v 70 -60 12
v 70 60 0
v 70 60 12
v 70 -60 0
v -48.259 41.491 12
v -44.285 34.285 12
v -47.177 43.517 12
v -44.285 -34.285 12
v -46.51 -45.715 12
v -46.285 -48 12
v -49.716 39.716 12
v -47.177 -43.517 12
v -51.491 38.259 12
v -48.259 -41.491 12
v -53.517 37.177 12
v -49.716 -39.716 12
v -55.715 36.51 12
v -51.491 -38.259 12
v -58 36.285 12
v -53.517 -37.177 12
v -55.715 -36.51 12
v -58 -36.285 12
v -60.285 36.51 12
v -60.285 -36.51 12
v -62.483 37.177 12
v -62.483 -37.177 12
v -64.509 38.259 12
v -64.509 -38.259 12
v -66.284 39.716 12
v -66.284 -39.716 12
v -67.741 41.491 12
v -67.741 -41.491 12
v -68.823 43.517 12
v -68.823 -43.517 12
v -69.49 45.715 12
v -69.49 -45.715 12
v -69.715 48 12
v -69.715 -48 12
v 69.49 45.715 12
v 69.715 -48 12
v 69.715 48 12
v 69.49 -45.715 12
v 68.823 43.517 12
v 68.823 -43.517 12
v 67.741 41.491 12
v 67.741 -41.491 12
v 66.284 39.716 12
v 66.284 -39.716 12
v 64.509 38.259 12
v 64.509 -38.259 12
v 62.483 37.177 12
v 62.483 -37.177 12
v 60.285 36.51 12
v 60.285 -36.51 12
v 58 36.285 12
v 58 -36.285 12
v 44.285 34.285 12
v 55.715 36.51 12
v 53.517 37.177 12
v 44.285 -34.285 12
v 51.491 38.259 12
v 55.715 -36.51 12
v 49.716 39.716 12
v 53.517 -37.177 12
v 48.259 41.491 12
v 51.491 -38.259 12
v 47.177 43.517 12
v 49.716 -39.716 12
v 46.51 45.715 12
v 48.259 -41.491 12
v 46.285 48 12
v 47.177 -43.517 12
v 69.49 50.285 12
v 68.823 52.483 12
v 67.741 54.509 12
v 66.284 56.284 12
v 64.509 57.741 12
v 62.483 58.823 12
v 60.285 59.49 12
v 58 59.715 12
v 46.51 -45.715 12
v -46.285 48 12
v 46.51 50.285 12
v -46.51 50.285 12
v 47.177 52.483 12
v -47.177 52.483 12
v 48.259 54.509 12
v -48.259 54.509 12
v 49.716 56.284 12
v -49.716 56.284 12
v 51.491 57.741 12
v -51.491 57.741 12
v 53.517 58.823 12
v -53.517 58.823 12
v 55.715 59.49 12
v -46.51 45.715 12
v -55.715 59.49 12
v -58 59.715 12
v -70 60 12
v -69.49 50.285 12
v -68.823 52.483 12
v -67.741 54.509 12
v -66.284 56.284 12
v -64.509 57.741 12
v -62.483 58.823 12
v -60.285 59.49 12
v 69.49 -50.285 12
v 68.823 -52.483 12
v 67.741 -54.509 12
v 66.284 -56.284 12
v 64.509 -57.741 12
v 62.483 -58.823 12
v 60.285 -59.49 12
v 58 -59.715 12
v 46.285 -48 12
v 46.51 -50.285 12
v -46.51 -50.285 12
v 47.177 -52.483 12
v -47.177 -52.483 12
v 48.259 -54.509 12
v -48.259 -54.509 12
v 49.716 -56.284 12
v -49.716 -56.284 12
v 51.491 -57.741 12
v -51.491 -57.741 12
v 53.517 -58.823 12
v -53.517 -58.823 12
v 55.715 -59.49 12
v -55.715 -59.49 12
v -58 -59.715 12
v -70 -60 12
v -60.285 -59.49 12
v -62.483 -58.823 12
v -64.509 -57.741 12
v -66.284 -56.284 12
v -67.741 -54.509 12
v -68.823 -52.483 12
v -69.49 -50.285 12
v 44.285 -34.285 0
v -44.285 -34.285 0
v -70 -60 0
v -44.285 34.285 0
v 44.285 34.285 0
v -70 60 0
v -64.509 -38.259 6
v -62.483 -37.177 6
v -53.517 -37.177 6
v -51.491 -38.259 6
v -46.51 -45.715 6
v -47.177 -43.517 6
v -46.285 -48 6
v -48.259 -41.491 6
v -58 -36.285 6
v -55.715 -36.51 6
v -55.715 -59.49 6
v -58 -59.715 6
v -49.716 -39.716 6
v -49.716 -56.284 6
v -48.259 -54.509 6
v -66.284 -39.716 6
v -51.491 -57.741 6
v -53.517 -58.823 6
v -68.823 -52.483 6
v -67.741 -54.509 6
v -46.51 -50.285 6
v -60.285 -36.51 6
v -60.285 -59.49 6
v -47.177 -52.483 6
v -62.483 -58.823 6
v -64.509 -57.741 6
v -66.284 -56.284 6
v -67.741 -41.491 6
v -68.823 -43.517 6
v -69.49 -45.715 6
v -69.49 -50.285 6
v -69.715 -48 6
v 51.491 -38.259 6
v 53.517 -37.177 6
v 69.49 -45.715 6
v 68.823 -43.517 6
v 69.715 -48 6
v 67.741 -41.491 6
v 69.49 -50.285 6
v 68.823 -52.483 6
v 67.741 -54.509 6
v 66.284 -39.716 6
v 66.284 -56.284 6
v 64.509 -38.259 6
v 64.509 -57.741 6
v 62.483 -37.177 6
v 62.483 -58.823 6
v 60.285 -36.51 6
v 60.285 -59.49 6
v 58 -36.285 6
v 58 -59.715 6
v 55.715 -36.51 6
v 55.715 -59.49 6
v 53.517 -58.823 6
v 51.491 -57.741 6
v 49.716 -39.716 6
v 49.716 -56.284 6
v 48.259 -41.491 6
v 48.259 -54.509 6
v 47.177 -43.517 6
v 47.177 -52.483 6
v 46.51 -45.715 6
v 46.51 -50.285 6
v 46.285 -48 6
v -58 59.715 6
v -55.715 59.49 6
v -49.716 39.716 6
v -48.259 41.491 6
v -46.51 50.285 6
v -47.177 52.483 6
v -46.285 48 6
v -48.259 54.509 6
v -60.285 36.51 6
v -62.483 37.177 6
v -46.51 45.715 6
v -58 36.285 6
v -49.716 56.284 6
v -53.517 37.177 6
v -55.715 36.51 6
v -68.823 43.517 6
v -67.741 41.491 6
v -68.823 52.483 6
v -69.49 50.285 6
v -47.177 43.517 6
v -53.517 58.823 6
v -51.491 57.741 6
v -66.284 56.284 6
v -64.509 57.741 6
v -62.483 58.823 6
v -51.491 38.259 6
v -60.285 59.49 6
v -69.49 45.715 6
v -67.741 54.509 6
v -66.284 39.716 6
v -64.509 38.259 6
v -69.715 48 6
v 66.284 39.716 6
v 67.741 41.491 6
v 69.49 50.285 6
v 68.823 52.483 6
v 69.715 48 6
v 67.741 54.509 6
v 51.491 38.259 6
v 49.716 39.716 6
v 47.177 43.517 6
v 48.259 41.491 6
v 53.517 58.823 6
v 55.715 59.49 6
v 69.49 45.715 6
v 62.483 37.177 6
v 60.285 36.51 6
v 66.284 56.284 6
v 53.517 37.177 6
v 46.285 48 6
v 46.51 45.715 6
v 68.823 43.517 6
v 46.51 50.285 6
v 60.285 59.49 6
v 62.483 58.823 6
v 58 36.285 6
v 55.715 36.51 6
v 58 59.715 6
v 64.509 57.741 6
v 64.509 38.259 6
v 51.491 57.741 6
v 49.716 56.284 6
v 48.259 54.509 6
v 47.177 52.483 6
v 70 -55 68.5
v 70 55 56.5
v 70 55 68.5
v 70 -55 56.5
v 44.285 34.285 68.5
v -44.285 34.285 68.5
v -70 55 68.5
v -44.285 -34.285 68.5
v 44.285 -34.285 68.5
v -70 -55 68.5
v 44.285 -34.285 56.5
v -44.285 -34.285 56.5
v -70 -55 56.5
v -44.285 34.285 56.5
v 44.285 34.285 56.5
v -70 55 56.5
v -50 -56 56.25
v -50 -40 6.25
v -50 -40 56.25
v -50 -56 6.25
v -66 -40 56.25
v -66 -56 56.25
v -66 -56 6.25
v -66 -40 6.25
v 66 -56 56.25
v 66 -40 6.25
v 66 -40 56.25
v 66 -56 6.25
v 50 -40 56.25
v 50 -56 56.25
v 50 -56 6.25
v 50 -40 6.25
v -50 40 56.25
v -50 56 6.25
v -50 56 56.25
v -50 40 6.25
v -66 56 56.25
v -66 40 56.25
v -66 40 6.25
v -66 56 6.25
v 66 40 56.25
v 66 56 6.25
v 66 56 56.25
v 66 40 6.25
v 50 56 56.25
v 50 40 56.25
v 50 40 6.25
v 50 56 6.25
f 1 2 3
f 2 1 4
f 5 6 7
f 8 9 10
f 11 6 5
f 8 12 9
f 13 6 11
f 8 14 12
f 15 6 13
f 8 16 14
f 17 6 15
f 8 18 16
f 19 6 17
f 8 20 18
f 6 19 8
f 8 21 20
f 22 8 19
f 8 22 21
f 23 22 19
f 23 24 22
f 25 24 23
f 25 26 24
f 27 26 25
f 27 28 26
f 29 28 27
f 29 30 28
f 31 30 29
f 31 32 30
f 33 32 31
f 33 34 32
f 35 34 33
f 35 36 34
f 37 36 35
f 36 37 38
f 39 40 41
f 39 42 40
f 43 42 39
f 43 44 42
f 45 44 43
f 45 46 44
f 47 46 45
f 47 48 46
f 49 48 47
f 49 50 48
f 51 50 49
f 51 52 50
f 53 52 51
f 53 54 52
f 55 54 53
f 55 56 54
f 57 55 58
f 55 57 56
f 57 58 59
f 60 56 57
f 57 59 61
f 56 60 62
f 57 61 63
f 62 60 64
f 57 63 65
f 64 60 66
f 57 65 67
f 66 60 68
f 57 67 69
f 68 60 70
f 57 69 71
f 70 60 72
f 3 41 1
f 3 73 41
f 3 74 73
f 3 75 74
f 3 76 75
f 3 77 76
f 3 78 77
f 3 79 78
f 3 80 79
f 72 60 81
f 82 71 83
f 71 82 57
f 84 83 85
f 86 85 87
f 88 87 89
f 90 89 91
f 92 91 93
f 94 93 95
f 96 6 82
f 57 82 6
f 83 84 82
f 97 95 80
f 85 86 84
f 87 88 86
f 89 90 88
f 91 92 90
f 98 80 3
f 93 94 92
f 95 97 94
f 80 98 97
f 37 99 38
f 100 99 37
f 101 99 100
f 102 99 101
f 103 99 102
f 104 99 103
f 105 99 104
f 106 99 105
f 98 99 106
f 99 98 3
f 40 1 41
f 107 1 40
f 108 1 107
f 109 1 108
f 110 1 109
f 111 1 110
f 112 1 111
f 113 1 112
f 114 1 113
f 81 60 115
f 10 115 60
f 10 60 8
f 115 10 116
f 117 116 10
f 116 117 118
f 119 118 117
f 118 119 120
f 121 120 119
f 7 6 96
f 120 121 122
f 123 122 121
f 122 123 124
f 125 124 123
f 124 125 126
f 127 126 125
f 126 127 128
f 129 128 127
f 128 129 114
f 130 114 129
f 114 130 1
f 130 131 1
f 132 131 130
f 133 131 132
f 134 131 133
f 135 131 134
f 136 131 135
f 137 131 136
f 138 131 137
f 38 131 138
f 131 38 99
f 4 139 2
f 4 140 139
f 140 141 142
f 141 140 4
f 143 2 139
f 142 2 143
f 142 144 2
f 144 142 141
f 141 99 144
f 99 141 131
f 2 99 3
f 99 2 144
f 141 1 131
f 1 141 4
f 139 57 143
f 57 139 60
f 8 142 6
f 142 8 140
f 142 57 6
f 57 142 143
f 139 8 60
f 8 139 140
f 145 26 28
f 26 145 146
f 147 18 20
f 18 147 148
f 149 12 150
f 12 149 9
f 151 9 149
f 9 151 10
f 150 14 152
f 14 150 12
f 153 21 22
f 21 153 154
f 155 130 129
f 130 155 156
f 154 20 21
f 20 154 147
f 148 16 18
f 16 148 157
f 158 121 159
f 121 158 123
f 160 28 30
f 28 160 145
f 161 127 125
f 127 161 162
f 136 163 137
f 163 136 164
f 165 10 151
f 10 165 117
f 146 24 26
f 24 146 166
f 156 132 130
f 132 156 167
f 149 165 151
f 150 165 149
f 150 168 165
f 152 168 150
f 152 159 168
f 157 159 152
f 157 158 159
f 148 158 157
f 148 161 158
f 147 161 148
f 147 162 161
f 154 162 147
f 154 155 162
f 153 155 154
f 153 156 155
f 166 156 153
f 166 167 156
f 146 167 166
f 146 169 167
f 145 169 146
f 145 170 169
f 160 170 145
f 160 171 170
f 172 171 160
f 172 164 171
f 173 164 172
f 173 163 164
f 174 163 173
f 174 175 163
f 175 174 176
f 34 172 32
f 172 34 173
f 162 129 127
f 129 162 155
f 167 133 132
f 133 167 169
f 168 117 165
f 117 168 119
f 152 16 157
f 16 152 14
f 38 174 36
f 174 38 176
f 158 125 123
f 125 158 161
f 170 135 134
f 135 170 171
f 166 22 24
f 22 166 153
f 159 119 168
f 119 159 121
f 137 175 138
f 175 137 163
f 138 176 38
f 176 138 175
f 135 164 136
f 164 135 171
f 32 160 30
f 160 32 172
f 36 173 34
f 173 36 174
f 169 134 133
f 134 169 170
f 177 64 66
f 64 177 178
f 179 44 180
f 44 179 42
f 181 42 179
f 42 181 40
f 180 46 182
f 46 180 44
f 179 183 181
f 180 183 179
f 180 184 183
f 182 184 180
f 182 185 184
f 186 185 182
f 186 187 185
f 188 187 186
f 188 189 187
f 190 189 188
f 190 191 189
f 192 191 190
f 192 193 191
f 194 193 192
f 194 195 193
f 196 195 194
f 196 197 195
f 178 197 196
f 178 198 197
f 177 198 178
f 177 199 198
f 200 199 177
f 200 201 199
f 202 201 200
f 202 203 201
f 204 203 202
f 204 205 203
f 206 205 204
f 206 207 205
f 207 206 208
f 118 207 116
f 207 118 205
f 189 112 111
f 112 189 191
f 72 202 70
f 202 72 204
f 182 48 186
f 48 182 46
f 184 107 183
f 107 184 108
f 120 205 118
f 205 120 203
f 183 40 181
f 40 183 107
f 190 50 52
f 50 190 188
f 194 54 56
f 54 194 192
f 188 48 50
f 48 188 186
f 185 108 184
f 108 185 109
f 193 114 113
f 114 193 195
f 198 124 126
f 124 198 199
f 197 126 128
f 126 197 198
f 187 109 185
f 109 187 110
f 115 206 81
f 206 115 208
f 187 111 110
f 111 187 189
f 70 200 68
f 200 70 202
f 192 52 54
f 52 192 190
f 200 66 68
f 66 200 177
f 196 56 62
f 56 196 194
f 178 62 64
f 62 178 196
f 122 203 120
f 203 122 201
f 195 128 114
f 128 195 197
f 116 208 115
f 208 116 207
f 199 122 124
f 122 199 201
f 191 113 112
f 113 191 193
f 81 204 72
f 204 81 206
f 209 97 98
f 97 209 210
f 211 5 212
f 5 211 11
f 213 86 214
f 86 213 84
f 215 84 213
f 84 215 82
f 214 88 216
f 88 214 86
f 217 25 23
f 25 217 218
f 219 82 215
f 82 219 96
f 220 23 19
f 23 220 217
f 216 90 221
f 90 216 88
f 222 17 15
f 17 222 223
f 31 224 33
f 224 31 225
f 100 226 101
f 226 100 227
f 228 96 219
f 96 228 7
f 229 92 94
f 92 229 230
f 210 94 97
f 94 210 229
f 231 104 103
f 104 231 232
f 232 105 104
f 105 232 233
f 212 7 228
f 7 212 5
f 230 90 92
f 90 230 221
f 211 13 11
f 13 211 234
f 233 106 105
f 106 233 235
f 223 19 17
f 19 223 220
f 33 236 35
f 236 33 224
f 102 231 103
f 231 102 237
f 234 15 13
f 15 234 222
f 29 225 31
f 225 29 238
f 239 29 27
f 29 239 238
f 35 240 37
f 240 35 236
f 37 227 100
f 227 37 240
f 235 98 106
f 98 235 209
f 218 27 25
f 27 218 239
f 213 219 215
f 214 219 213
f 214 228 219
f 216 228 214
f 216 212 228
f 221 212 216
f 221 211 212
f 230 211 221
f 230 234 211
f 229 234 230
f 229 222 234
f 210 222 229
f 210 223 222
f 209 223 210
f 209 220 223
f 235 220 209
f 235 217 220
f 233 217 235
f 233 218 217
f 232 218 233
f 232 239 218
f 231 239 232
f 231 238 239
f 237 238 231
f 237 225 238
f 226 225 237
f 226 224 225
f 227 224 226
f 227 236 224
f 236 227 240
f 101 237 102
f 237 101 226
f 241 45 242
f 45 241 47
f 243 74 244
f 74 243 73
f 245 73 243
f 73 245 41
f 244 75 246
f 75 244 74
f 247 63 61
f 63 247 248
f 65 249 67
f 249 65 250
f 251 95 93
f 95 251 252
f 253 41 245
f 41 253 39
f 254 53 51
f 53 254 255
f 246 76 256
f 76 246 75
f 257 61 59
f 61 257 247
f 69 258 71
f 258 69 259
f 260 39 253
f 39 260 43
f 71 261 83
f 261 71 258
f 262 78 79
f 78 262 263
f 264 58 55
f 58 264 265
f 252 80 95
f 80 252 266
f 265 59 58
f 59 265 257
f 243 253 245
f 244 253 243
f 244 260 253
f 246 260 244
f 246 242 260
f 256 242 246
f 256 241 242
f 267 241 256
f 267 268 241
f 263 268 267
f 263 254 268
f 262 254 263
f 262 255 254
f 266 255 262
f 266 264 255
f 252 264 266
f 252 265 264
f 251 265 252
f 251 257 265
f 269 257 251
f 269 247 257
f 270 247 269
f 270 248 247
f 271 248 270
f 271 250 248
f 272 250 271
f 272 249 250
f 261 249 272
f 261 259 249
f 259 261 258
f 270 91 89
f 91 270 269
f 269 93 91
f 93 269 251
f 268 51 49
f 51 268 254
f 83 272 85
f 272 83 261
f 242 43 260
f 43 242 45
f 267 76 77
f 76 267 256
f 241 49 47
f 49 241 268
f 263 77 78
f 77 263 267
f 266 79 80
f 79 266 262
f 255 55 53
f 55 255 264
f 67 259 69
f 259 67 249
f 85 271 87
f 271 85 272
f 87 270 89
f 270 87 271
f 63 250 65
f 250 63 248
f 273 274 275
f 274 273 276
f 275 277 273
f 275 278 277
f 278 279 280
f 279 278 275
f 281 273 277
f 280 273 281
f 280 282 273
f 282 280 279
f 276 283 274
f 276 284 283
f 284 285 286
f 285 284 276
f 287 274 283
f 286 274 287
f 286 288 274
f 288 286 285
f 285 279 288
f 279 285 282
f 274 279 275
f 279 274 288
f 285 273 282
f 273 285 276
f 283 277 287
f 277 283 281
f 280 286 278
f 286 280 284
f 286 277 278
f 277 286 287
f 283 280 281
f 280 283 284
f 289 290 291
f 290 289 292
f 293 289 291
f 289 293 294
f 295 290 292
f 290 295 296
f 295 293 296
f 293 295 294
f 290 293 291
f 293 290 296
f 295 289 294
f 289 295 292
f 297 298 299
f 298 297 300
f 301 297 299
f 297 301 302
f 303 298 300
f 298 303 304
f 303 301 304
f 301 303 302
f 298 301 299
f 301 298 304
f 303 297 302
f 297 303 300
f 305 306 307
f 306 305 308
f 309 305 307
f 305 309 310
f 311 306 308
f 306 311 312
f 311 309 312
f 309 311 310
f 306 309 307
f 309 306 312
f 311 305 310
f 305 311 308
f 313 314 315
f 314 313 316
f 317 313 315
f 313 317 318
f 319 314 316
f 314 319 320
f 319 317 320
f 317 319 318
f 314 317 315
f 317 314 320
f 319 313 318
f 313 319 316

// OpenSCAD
$fn = 32;

// ------------------------------------------------------------------------
// Frame cube: base 140 x 120 mm, posts 50 mm tall
// Every part is its own module, assembly() places every instance.
// ------------------------------------------------------------------------

// --- part 1 ---
module base_frame() {
  difference() {
    translate([-70, -60, 0]) cube([140, 120, 12]);
    translate([-44.285, -34.285, -1]) cube([88.57, 68.57, 14]);
    translate([-58, -48, 6]) cylinder(h = 7, d = 23.43);
    translate([58, -48, 6]) cylinder(h = 7, d = 23.43);
    translate([-58, 48, 6]) cylinder(h = 7, d = 23.43);
    translate([58, 48, 6]) cylinder(h = 7, d = 23.43);
  }
}

// --- part 2 ---
module corner_post() {
  translate([-8, -8, 0]) cube([16, 16, 50]);
}

// --- part 3 ---
module top_frame() {
  difference() {
    translate([-70, -55, 0]) cube([140, 110, 12]);
    translate([-44.285, -34.285, -1]) cube([88.57, 68.57, 14]);
  }
}

// --- assembly ---
module assembly() {
  color([0.80, 0.24, 0.20]) translate([0, 0, 0]) rotate([0, 0, 0]) base_frame();
  color([0.20, 0.45, 0.75]) translate([-58, -48, 6.25]) rotate([0, 0, 0]) corner_post();
  color([0.25, 0.62, 0.32]) translate([58, -48, 6.25]) rotate([0, 0, 0]) corner_post();
  color([0.92, 0.70, 0.18]) translate([-58, 48, 6.25]) rotate([0, 0, 0]) corner_post();
  color([0.58, 0.35, 0.70]) translate([58, 48, 6.25]) rotate([0, 0, 0]) corner_post();
  color([0.16, 0.66, 0.66]) translate([0, 0, 56.5]) rotate([0, 0, 0]) top_frame();
}

assembly();
